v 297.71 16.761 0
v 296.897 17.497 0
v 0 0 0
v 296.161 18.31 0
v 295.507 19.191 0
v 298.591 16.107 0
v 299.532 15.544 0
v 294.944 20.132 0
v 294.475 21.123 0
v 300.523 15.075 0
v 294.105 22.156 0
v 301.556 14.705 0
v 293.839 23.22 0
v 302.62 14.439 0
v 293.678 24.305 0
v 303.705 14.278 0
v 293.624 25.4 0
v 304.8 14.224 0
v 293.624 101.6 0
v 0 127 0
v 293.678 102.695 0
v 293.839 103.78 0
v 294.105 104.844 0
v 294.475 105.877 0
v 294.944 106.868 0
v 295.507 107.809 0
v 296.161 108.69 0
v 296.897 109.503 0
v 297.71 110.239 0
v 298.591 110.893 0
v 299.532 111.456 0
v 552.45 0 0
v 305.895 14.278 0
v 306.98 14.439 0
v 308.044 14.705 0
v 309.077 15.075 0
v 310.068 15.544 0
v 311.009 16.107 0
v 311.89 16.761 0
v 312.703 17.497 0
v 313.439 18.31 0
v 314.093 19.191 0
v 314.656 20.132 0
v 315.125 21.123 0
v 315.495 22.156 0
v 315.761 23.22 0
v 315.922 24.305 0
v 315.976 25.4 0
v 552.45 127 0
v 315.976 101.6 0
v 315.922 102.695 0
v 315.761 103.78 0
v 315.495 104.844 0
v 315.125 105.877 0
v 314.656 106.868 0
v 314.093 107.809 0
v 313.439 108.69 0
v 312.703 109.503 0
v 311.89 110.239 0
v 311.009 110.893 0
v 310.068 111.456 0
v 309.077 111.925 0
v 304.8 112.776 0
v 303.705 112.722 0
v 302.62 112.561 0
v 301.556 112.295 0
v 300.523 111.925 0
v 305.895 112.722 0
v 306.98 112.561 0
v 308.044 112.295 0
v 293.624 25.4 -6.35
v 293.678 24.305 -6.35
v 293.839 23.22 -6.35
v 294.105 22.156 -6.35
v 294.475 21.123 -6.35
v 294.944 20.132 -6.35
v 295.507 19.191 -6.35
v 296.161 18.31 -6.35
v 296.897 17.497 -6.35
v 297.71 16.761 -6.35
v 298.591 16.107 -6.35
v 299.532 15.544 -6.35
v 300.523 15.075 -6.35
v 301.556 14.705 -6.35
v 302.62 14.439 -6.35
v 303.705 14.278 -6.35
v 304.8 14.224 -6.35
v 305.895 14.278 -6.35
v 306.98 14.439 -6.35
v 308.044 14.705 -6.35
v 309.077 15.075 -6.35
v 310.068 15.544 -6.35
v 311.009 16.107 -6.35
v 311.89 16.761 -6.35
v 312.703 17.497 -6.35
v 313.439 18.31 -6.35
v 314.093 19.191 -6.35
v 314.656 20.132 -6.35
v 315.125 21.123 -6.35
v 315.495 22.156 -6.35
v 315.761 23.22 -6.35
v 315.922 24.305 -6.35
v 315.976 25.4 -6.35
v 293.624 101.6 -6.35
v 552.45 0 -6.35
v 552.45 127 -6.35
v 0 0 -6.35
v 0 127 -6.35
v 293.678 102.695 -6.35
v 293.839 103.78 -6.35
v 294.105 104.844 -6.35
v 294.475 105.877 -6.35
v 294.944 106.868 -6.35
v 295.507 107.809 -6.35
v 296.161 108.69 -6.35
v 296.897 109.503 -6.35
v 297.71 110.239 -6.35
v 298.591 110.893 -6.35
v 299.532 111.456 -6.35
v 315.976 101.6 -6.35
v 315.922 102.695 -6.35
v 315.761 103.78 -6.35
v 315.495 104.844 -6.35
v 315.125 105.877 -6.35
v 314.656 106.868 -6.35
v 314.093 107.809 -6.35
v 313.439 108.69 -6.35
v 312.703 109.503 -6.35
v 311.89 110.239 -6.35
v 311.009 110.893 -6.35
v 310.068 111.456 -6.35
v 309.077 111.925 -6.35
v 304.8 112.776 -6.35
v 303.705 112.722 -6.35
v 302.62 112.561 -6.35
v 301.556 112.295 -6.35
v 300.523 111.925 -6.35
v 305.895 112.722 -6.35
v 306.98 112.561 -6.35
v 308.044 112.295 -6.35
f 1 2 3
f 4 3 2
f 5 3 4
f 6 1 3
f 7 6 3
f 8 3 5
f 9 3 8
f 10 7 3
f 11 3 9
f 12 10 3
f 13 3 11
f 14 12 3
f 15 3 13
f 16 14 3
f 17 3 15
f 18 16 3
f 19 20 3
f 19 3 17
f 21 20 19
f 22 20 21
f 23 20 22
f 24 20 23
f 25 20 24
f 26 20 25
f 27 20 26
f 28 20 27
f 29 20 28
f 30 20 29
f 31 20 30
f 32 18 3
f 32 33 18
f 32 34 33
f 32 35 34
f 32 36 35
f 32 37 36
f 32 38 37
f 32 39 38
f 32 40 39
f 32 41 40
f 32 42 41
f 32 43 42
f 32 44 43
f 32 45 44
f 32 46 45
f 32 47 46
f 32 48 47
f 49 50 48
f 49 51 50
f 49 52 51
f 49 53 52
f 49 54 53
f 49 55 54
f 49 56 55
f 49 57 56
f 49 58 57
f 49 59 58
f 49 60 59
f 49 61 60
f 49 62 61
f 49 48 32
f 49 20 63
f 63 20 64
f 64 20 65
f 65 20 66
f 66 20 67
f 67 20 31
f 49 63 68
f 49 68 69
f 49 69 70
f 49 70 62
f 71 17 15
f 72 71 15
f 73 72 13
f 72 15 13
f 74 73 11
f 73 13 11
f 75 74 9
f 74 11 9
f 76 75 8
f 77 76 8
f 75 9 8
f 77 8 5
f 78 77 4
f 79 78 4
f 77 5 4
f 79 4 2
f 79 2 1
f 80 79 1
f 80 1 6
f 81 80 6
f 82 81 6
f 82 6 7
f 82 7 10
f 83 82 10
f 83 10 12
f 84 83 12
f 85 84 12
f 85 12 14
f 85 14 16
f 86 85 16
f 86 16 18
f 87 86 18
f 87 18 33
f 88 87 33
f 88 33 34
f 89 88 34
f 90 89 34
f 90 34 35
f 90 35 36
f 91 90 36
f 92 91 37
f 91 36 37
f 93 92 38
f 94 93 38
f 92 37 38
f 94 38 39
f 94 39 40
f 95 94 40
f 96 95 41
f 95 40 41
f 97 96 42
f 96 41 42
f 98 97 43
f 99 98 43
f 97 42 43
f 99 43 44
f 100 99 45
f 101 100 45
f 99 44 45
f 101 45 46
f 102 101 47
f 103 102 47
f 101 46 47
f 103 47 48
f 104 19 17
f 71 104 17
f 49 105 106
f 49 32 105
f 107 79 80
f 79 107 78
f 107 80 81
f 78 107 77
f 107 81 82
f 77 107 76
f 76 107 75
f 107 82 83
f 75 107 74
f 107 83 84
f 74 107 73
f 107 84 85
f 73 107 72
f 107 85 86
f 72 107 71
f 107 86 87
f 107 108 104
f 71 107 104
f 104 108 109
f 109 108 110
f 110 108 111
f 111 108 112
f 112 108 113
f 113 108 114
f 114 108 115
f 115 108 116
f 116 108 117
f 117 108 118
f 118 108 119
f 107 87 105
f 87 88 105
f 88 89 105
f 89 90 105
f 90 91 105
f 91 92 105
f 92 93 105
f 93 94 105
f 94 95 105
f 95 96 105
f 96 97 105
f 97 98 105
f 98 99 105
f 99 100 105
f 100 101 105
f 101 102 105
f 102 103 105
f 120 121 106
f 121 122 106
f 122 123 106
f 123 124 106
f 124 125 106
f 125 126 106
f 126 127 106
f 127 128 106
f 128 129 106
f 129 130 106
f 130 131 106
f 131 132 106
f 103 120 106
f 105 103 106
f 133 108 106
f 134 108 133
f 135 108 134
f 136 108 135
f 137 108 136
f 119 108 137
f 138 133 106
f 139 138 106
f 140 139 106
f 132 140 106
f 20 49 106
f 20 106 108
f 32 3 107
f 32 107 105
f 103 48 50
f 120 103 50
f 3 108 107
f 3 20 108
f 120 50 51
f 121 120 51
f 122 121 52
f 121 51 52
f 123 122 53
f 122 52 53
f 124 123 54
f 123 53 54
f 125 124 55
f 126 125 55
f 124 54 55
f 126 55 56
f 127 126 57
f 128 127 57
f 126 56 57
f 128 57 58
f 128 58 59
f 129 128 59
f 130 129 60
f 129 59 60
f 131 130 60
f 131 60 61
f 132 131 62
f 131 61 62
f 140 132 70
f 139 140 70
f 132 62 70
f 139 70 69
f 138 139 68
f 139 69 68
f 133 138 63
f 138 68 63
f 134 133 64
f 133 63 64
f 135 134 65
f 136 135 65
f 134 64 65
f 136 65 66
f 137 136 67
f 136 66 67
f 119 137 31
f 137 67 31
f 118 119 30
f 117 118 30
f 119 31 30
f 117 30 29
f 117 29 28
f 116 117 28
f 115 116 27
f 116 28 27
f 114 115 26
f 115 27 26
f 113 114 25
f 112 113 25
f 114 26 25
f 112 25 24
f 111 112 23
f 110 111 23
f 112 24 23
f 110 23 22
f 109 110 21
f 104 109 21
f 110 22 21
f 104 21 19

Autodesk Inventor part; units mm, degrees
ref_plane "YZ Plane" through (0, 0, 0) normal (1, 0, 0) x (0, 1, 0)
ref_plane "XZ Plane" through (0, 0, 0) normal (0, 1, 0) x (-1, 0, 0)
ref_plane "XY Plane" through (0, 0, 0) normal (0, 0, 1) x (1, 0, 0)
sketch "Sketch1" plane through (0, 0, 0) normal (0, 0, 1) x (1, 0, 0)
  line L0 (0, 0) -> (552.45, 0)
  line L1 (552.45, 0) -> (552.45, 127)
  line L2 (552.45, 127) -> (0, 127)
  line L3 (0, 127) -> (0, 0)
  dimension "d0" = 552.45
  dimension "d1" = 127
extrude "Extrusion1" add sketch "Sketch1" against normal blind 6.35
sketch "Sketch2" plane through (0, 0, 0) normal (0, 0, 1) x (1, 0, 0)
  line L0 (552.45, 0) -> (552.45, 127) projected
  line L1 (552.45, 127) -> (0, 127) projected
  line L2 (0, 127) -> (0, 0) projected
  line L3 (315.976, 25.4) -> (315.976, 101.6)
  arc A0 (315.976, 101.6) -> (293.624, 101.6) centre (304.8, 101.6) ccw
  line L4 (293.624, 101.6) -> (293.624, 25.4)
  arc A1 (293.624, 25.4) -> (315.976, 25.4) centre (304.8, 25.4) ccw
  point P0 (276.225, 127)
  dimension "d4" = 76.2
  dimension "d6" = 11.176
  dimension "d7" = 247.65
  dimension "d8" = 25.4
extrude "Extrusion2" cut sketch "Sketch2" against normal up to next
properties part number "GE_13030" material "Polyethylene, High Density"
